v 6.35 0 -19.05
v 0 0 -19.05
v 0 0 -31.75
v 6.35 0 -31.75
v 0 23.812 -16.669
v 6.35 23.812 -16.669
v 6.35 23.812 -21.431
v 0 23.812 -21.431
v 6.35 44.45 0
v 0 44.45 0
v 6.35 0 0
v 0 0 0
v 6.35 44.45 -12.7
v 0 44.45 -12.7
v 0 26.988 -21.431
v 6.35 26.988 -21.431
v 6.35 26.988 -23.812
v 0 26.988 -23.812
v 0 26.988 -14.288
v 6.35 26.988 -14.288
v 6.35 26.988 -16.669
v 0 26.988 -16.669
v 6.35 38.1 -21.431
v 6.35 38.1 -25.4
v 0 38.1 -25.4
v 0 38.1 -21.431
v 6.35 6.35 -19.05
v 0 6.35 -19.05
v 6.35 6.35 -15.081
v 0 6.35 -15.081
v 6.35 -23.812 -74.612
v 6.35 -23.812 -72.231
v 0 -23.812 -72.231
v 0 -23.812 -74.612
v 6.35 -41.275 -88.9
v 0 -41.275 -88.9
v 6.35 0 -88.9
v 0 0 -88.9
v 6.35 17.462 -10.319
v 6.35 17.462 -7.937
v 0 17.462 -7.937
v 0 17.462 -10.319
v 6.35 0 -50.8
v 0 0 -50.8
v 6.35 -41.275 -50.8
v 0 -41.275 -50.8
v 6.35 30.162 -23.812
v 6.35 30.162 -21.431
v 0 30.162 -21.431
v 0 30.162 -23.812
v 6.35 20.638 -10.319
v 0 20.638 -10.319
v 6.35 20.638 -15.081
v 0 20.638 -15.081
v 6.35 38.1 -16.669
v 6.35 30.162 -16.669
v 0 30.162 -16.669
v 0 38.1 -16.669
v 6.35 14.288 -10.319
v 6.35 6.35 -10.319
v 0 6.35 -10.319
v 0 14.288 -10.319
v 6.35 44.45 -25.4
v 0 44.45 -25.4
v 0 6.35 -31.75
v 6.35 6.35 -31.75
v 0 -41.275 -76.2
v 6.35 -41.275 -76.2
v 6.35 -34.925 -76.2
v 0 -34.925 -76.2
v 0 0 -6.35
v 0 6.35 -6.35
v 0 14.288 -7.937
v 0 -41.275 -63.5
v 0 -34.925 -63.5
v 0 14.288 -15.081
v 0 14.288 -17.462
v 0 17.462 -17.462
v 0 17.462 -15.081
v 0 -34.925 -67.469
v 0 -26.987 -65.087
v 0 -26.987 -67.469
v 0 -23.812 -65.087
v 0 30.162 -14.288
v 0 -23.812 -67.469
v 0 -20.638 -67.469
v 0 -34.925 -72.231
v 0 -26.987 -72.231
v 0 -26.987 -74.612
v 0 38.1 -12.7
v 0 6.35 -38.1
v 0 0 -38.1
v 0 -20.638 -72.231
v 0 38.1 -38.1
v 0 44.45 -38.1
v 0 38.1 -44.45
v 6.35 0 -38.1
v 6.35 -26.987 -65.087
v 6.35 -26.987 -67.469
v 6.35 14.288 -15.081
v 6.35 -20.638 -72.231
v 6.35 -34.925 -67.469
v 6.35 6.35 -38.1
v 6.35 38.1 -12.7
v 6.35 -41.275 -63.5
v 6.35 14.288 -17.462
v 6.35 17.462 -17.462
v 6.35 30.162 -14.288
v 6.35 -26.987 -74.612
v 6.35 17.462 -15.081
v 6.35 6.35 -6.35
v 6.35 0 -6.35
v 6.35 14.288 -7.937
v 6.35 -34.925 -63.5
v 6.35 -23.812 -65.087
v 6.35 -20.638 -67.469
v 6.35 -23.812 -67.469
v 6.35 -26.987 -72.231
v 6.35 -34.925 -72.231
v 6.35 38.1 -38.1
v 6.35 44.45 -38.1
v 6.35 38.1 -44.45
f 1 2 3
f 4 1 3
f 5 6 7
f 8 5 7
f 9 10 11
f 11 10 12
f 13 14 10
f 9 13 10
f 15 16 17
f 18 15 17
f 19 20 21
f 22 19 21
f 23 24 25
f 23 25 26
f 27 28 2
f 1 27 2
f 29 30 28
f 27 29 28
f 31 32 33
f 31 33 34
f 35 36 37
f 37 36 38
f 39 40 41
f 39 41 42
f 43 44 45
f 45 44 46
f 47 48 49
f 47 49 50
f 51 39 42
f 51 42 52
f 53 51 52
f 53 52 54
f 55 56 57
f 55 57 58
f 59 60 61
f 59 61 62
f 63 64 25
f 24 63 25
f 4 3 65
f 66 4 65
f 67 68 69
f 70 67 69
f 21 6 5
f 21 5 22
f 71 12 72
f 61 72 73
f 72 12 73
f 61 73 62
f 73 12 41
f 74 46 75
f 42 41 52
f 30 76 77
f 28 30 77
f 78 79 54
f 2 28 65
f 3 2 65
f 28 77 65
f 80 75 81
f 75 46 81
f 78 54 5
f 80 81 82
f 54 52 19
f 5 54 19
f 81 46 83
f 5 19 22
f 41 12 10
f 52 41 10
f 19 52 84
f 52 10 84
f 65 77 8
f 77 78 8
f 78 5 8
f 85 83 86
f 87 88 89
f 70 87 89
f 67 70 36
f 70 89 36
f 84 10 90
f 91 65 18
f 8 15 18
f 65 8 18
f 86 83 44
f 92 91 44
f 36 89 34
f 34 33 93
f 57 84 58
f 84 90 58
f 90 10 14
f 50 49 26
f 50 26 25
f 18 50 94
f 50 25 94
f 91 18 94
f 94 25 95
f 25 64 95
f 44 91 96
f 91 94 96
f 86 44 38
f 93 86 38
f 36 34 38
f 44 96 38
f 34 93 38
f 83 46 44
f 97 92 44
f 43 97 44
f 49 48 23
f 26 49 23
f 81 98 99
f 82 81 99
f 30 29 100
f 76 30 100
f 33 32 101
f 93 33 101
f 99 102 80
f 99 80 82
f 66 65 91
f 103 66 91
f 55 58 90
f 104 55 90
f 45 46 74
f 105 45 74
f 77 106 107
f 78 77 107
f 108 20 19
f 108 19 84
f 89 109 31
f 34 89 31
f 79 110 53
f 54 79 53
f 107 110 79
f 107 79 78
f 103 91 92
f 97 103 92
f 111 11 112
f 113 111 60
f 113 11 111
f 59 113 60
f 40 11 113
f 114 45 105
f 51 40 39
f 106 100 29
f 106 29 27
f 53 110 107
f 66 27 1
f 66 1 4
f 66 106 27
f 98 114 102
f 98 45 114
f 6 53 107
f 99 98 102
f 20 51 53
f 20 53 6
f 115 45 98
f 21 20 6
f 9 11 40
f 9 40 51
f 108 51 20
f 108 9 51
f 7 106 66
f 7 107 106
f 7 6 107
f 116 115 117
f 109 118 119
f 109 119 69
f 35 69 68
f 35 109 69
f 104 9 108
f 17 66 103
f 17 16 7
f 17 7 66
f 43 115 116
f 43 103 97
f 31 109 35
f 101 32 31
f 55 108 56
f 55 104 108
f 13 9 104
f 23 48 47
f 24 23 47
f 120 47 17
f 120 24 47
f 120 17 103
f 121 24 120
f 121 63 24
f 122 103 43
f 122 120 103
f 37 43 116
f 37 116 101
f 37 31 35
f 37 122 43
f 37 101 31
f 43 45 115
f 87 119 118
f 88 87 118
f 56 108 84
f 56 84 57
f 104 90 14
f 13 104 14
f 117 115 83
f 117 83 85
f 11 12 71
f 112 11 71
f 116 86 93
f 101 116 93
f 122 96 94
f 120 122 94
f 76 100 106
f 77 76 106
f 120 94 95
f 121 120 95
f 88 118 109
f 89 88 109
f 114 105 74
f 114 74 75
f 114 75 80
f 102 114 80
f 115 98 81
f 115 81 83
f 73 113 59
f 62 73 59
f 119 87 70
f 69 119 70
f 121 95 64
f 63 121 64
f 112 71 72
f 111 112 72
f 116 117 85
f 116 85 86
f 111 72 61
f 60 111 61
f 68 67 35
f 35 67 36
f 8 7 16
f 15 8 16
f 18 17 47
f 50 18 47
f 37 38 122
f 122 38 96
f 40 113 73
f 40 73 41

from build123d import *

# Parameters (mm, degrees)
SKETCH1_W           = 12.7
SKETCH1_H           = 6.35
SKETCH1_W_2         = 38.1
SKETCH1_H_2         = 34.925
BOSS_EXTRUDE1_DEPTH = 6.35
SKETCH2_W           = 4.7625
SKETCH2_H           = 14.2875
SKETCH2_W_2         = 9.525
SKETCH2_H_2         = 3.175
CUT_EXTRUDE1_DEPTH  = 6.35


with BuildPart() as part:
    # Sketch1 → Boss-Extrude1 (new body)
    with BuildSketch(Plane(origin=(0, 0, 0), x_dir=(0, 0, -1), z_dir=(1, 0, 0))):
        Polygon((12.7, 38.1), (12.7, 44.45), (0, 44.45), (0, 0), (6.35, 0), (6.35, 6.35), (19.05, 6.35), (19.05, 0), (31.75, 0), (31.75, 6.35), (38.1, 6.35), (38.1, 0), (44.45, 0), (44.45, 38.1), (38.1, 38.1), (38.1, 44.45), (25.4, 44.45), (25.4, 38.1), align=None)
        Polygon((88.9, 0), (44.45, 38.1), (44.45, 0), (50.8, 0), align=None)
        with Locations((57.15, -38.1)):
            Rectangle(SKETCH1_W, SKETCH1_H)
        with Locations((69.85, -17.4625)):
            Rectangle(SKETCH1_W_2, SKETCH1_H_2)
        with Locations((82.55, -38.1)):
            Rectangle(SKETCH1_W, SKETCH1_H)
    extrude(amount=BOSS_EXTRUDE1_DEPTH)

    # Sketch2 → Cut-Extrude1 (cut)
    with BuildSketch(Plane(origin=(6.35, 0, 0), x_dir=(0, 0, -1), z_dir=(1, 0, 0))):
        with Locations((12.7, 13.49375)):
            Rectangle(SKETCH2_W, SKETCH2_H)
        with Locations((12.7, 15.875)):
            Rectangle(SKETCH2_W_2, SKETCH2_H_2)
        with Locations((19.05, 30.95625)):
            Rectangle(SKETCH2_W, SKETCH2_H)
        with Locations((19.05, 28.575)):
            Rectangle(SKETCH2_W_2, SKETCH2_H_2)
        with Locations((69.85, -27.78125)):
            Rectangle(SKETCH2_W, SKETCH2_H)
        with Locations((69.85, -25.4)):
            Rectangle(SKETCH2_W_2, SKETCH2_H_2)
    extrude(amount=-CUT_EXTRUDE1_DEPTH, mode=Mode.SUBTRACT)


solid = part.part
